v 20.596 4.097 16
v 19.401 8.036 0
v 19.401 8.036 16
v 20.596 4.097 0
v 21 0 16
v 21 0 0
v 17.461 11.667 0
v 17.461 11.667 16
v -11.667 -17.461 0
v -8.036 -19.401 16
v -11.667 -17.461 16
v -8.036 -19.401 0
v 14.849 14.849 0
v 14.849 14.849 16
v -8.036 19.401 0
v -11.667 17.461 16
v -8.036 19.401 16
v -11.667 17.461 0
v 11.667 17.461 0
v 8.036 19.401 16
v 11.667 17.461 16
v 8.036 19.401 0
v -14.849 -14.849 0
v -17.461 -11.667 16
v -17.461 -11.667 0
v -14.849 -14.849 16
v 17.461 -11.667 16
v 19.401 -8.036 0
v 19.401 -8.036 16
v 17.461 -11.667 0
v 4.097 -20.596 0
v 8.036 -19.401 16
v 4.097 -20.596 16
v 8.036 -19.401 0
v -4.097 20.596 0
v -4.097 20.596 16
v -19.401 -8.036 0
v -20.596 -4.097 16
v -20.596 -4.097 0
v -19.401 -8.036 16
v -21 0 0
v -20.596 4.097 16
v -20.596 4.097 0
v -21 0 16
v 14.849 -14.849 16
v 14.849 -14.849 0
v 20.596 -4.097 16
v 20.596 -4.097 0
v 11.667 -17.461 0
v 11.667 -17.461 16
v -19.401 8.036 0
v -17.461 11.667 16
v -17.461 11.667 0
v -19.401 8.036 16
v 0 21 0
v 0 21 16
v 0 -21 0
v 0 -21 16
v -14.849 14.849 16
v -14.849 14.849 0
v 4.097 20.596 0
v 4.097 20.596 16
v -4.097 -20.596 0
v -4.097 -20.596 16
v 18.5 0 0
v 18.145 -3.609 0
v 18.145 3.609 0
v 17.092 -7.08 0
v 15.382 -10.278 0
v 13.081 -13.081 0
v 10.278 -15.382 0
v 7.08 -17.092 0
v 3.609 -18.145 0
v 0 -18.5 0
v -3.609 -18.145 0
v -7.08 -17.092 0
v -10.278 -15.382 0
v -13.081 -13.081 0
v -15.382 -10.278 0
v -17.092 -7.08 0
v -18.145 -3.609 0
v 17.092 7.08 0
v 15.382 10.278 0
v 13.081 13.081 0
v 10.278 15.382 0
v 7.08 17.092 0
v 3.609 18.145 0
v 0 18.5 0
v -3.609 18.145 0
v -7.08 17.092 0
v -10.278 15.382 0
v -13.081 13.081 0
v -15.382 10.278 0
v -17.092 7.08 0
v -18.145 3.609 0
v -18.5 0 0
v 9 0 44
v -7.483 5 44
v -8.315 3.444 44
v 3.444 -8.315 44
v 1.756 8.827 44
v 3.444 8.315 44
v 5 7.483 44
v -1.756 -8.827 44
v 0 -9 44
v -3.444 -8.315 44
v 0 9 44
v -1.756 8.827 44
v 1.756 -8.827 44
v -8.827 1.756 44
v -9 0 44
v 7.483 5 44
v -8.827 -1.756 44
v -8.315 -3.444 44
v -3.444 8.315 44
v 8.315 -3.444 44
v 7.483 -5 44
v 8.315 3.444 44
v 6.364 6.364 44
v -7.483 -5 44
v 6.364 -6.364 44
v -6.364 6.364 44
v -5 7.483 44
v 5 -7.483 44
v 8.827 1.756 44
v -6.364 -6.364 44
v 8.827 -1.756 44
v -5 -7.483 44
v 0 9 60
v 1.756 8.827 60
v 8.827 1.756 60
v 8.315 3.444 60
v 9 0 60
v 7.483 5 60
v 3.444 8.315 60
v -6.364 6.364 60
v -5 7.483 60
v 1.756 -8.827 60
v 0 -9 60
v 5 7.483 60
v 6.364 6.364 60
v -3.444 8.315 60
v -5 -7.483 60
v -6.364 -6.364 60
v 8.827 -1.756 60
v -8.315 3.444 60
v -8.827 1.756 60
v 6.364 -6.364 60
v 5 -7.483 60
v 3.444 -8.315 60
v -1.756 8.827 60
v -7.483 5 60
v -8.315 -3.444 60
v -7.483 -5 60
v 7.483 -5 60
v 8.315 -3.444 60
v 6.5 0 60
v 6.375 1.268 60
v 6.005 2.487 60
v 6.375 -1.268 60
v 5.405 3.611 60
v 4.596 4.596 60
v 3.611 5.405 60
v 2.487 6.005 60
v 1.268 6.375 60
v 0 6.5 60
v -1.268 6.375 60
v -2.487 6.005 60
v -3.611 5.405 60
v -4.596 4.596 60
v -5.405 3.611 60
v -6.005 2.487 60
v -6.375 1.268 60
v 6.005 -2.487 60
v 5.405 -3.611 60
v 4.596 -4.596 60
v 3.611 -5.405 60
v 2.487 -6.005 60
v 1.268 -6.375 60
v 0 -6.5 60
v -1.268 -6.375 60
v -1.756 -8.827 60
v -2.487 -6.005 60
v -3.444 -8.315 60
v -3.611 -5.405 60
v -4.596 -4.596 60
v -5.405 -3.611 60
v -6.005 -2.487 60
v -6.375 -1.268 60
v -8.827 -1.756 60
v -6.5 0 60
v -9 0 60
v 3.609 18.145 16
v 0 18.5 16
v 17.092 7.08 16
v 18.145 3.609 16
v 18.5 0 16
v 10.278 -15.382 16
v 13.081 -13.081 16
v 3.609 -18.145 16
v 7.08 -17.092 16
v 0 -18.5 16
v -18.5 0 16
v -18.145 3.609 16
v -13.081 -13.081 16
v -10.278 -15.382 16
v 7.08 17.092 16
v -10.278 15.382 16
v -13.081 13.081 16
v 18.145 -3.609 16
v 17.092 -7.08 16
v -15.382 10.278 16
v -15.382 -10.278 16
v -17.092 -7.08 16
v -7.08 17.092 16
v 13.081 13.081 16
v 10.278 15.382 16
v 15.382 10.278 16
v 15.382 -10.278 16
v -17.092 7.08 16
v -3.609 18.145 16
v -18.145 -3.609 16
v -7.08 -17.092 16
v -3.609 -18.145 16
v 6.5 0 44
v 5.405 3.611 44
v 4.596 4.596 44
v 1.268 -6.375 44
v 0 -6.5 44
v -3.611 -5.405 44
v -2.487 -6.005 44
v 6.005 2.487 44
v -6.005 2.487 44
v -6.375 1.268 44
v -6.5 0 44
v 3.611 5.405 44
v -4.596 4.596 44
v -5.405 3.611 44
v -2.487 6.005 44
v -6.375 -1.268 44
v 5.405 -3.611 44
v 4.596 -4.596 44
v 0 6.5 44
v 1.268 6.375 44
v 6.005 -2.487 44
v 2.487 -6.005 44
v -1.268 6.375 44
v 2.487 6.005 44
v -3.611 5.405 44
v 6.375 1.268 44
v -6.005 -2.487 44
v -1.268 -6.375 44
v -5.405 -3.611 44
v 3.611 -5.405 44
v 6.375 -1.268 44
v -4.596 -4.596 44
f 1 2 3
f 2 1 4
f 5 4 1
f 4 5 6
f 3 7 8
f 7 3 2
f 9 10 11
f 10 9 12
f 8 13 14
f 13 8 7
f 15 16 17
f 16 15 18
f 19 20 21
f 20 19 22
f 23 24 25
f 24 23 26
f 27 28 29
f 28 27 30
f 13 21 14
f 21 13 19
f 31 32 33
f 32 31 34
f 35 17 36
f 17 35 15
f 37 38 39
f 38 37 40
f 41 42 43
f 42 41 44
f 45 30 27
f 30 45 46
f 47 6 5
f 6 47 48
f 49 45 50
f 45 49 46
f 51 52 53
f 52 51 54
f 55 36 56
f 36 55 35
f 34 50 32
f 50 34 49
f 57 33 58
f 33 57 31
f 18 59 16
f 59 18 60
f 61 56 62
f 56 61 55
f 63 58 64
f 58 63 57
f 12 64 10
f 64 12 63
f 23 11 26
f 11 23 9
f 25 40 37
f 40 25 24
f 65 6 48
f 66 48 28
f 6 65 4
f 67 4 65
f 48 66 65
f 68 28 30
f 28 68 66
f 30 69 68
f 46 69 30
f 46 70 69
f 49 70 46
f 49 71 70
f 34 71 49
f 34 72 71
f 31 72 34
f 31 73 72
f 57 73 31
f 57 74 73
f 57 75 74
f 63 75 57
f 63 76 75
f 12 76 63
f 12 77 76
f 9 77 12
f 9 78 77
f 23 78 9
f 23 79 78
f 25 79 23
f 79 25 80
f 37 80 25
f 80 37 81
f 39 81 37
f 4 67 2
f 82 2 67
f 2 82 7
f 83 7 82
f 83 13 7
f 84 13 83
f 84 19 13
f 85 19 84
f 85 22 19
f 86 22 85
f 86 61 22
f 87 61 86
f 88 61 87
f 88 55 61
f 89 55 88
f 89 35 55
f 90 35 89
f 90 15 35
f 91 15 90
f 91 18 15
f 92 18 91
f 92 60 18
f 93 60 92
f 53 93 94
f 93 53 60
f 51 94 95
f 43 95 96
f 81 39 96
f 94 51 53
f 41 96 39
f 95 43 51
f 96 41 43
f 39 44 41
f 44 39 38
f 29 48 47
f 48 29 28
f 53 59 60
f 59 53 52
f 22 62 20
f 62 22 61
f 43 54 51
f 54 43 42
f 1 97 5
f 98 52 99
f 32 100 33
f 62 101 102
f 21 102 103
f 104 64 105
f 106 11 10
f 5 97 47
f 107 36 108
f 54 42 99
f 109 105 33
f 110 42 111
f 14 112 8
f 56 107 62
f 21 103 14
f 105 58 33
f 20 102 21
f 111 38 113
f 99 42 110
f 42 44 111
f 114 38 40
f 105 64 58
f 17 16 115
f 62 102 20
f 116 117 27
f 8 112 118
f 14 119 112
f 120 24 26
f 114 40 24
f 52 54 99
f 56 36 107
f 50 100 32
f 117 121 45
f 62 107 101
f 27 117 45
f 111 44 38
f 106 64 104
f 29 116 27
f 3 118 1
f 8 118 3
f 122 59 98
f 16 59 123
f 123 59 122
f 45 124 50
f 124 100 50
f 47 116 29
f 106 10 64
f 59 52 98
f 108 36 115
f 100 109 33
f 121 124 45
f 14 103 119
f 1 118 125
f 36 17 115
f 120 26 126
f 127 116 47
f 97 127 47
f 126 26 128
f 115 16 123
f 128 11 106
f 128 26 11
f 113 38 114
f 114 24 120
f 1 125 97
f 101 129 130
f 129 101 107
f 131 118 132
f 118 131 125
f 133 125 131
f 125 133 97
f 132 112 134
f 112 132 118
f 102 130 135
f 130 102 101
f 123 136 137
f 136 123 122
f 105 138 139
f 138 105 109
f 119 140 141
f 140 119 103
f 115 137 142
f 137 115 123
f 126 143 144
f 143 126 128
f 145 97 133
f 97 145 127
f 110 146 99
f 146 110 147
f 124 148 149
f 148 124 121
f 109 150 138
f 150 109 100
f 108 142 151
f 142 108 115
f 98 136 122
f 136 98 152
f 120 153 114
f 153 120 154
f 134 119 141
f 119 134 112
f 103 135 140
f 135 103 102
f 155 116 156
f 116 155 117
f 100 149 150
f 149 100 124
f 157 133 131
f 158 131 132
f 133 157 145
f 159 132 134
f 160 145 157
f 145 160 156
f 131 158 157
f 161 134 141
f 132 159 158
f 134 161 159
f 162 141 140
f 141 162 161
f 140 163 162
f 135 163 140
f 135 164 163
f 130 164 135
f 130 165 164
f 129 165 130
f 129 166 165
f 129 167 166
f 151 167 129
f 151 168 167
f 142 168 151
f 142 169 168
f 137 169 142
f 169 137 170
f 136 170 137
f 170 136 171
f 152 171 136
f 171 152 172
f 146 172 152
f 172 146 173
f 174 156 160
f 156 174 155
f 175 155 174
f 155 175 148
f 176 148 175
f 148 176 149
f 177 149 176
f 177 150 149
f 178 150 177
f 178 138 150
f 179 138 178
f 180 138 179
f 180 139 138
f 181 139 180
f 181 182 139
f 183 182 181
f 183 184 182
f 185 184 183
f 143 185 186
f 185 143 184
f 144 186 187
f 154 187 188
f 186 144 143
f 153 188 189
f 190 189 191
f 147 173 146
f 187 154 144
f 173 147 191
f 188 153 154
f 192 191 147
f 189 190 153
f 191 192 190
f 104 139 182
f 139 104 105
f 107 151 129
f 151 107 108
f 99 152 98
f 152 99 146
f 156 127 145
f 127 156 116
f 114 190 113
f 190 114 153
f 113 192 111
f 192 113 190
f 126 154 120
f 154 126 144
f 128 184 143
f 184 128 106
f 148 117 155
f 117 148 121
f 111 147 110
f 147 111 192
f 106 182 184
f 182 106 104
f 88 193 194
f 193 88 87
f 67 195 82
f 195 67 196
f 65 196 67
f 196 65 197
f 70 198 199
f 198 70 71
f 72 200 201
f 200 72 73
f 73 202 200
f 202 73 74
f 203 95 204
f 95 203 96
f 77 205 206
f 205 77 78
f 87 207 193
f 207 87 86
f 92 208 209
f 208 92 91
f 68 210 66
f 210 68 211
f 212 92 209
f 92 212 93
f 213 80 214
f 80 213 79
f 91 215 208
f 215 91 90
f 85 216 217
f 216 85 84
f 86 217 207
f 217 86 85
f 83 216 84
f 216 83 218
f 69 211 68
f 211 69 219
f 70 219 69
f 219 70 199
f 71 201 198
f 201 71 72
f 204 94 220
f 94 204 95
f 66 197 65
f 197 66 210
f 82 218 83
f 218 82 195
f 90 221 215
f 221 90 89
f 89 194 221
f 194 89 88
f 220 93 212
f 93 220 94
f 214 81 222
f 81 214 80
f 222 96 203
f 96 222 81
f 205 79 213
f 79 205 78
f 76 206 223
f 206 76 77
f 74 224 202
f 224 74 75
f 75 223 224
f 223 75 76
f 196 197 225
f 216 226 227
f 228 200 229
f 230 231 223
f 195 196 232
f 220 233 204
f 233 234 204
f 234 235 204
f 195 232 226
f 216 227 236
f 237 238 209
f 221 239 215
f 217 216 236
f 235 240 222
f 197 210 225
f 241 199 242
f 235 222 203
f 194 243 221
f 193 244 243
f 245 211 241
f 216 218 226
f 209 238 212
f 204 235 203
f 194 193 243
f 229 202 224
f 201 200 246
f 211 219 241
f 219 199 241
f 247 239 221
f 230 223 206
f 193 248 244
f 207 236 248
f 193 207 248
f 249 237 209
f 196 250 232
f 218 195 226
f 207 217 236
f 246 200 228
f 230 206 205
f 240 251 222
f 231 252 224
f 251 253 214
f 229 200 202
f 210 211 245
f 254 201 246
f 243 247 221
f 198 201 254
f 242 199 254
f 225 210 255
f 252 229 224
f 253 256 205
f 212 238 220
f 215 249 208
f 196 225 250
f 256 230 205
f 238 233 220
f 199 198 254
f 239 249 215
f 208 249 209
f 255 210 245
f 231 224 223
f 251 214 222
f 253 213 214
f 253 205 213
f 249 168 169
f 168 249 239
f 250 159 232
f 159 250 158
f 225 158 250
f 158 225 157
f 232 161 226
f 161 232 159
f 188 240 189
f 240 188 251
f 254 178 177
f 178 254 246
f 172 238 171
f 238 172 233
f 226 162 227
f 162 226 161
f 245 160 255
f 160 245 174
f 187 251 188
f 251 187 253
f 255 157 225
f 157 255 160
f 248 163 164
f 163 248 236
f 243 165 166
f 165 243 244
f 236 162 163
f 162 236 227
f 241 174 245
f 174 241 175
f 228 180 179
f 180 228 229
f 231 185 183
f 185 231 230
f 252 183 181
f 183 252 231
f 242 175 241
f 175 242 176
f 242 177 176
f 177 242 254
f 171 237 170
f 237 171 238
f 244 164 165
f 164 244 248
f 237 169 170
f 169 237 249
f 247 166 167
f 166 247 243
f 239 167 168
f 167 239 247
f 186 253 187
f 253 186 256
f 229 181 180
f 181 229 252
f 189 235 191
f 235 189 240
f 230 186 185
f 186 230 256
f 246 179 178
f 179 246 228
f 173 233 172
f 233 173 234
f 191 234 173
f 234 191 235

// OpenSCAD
$fn = 32;
// Conical pipe reducer 42 mm to 18 mm.

large_d = 42;
small_d = 18;
wall = 2.5;
cone_l = 28;
collar_a = 16;
collar_b = 16;

difference() {
    union() {
        cylinder(h = collar_a, d = large_d);
        translate([0, 0, collar_a])
            cylinder(h = cone_l, d1 = large_d, d2 = small_d);
        translate([0, 0, collar_a + cone_l])
            cylinder(h = collar_b, d = small_d);
    }
    translate([0, 0, -1])
        cylinder(h = collar_a + 1, d = large_d - 2 * wall);
    translate([0, 0, collar_a])
        cylinder(h = cone_l, d1 = large_d - 2 * wall, d2 = small_d - 2 * wall);
    translate([0, 0, collar_a + cone_l])
        cylinder(h = collar_b + 1, d = small_d - 2 * wall);
}
